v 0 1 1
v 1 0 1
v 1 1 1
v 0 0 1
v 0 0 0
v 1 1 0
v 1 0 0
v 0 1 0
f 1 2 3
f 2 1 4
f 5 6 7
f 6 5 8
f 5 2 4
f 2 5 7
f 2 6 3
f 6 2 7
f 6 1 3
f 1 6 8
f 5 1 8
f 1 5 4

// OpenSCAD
x=2;
y=1;
if (x > y)
{
    cube(size = 1, center = false);
} else {
    cube(size = 2, center = true);
}
